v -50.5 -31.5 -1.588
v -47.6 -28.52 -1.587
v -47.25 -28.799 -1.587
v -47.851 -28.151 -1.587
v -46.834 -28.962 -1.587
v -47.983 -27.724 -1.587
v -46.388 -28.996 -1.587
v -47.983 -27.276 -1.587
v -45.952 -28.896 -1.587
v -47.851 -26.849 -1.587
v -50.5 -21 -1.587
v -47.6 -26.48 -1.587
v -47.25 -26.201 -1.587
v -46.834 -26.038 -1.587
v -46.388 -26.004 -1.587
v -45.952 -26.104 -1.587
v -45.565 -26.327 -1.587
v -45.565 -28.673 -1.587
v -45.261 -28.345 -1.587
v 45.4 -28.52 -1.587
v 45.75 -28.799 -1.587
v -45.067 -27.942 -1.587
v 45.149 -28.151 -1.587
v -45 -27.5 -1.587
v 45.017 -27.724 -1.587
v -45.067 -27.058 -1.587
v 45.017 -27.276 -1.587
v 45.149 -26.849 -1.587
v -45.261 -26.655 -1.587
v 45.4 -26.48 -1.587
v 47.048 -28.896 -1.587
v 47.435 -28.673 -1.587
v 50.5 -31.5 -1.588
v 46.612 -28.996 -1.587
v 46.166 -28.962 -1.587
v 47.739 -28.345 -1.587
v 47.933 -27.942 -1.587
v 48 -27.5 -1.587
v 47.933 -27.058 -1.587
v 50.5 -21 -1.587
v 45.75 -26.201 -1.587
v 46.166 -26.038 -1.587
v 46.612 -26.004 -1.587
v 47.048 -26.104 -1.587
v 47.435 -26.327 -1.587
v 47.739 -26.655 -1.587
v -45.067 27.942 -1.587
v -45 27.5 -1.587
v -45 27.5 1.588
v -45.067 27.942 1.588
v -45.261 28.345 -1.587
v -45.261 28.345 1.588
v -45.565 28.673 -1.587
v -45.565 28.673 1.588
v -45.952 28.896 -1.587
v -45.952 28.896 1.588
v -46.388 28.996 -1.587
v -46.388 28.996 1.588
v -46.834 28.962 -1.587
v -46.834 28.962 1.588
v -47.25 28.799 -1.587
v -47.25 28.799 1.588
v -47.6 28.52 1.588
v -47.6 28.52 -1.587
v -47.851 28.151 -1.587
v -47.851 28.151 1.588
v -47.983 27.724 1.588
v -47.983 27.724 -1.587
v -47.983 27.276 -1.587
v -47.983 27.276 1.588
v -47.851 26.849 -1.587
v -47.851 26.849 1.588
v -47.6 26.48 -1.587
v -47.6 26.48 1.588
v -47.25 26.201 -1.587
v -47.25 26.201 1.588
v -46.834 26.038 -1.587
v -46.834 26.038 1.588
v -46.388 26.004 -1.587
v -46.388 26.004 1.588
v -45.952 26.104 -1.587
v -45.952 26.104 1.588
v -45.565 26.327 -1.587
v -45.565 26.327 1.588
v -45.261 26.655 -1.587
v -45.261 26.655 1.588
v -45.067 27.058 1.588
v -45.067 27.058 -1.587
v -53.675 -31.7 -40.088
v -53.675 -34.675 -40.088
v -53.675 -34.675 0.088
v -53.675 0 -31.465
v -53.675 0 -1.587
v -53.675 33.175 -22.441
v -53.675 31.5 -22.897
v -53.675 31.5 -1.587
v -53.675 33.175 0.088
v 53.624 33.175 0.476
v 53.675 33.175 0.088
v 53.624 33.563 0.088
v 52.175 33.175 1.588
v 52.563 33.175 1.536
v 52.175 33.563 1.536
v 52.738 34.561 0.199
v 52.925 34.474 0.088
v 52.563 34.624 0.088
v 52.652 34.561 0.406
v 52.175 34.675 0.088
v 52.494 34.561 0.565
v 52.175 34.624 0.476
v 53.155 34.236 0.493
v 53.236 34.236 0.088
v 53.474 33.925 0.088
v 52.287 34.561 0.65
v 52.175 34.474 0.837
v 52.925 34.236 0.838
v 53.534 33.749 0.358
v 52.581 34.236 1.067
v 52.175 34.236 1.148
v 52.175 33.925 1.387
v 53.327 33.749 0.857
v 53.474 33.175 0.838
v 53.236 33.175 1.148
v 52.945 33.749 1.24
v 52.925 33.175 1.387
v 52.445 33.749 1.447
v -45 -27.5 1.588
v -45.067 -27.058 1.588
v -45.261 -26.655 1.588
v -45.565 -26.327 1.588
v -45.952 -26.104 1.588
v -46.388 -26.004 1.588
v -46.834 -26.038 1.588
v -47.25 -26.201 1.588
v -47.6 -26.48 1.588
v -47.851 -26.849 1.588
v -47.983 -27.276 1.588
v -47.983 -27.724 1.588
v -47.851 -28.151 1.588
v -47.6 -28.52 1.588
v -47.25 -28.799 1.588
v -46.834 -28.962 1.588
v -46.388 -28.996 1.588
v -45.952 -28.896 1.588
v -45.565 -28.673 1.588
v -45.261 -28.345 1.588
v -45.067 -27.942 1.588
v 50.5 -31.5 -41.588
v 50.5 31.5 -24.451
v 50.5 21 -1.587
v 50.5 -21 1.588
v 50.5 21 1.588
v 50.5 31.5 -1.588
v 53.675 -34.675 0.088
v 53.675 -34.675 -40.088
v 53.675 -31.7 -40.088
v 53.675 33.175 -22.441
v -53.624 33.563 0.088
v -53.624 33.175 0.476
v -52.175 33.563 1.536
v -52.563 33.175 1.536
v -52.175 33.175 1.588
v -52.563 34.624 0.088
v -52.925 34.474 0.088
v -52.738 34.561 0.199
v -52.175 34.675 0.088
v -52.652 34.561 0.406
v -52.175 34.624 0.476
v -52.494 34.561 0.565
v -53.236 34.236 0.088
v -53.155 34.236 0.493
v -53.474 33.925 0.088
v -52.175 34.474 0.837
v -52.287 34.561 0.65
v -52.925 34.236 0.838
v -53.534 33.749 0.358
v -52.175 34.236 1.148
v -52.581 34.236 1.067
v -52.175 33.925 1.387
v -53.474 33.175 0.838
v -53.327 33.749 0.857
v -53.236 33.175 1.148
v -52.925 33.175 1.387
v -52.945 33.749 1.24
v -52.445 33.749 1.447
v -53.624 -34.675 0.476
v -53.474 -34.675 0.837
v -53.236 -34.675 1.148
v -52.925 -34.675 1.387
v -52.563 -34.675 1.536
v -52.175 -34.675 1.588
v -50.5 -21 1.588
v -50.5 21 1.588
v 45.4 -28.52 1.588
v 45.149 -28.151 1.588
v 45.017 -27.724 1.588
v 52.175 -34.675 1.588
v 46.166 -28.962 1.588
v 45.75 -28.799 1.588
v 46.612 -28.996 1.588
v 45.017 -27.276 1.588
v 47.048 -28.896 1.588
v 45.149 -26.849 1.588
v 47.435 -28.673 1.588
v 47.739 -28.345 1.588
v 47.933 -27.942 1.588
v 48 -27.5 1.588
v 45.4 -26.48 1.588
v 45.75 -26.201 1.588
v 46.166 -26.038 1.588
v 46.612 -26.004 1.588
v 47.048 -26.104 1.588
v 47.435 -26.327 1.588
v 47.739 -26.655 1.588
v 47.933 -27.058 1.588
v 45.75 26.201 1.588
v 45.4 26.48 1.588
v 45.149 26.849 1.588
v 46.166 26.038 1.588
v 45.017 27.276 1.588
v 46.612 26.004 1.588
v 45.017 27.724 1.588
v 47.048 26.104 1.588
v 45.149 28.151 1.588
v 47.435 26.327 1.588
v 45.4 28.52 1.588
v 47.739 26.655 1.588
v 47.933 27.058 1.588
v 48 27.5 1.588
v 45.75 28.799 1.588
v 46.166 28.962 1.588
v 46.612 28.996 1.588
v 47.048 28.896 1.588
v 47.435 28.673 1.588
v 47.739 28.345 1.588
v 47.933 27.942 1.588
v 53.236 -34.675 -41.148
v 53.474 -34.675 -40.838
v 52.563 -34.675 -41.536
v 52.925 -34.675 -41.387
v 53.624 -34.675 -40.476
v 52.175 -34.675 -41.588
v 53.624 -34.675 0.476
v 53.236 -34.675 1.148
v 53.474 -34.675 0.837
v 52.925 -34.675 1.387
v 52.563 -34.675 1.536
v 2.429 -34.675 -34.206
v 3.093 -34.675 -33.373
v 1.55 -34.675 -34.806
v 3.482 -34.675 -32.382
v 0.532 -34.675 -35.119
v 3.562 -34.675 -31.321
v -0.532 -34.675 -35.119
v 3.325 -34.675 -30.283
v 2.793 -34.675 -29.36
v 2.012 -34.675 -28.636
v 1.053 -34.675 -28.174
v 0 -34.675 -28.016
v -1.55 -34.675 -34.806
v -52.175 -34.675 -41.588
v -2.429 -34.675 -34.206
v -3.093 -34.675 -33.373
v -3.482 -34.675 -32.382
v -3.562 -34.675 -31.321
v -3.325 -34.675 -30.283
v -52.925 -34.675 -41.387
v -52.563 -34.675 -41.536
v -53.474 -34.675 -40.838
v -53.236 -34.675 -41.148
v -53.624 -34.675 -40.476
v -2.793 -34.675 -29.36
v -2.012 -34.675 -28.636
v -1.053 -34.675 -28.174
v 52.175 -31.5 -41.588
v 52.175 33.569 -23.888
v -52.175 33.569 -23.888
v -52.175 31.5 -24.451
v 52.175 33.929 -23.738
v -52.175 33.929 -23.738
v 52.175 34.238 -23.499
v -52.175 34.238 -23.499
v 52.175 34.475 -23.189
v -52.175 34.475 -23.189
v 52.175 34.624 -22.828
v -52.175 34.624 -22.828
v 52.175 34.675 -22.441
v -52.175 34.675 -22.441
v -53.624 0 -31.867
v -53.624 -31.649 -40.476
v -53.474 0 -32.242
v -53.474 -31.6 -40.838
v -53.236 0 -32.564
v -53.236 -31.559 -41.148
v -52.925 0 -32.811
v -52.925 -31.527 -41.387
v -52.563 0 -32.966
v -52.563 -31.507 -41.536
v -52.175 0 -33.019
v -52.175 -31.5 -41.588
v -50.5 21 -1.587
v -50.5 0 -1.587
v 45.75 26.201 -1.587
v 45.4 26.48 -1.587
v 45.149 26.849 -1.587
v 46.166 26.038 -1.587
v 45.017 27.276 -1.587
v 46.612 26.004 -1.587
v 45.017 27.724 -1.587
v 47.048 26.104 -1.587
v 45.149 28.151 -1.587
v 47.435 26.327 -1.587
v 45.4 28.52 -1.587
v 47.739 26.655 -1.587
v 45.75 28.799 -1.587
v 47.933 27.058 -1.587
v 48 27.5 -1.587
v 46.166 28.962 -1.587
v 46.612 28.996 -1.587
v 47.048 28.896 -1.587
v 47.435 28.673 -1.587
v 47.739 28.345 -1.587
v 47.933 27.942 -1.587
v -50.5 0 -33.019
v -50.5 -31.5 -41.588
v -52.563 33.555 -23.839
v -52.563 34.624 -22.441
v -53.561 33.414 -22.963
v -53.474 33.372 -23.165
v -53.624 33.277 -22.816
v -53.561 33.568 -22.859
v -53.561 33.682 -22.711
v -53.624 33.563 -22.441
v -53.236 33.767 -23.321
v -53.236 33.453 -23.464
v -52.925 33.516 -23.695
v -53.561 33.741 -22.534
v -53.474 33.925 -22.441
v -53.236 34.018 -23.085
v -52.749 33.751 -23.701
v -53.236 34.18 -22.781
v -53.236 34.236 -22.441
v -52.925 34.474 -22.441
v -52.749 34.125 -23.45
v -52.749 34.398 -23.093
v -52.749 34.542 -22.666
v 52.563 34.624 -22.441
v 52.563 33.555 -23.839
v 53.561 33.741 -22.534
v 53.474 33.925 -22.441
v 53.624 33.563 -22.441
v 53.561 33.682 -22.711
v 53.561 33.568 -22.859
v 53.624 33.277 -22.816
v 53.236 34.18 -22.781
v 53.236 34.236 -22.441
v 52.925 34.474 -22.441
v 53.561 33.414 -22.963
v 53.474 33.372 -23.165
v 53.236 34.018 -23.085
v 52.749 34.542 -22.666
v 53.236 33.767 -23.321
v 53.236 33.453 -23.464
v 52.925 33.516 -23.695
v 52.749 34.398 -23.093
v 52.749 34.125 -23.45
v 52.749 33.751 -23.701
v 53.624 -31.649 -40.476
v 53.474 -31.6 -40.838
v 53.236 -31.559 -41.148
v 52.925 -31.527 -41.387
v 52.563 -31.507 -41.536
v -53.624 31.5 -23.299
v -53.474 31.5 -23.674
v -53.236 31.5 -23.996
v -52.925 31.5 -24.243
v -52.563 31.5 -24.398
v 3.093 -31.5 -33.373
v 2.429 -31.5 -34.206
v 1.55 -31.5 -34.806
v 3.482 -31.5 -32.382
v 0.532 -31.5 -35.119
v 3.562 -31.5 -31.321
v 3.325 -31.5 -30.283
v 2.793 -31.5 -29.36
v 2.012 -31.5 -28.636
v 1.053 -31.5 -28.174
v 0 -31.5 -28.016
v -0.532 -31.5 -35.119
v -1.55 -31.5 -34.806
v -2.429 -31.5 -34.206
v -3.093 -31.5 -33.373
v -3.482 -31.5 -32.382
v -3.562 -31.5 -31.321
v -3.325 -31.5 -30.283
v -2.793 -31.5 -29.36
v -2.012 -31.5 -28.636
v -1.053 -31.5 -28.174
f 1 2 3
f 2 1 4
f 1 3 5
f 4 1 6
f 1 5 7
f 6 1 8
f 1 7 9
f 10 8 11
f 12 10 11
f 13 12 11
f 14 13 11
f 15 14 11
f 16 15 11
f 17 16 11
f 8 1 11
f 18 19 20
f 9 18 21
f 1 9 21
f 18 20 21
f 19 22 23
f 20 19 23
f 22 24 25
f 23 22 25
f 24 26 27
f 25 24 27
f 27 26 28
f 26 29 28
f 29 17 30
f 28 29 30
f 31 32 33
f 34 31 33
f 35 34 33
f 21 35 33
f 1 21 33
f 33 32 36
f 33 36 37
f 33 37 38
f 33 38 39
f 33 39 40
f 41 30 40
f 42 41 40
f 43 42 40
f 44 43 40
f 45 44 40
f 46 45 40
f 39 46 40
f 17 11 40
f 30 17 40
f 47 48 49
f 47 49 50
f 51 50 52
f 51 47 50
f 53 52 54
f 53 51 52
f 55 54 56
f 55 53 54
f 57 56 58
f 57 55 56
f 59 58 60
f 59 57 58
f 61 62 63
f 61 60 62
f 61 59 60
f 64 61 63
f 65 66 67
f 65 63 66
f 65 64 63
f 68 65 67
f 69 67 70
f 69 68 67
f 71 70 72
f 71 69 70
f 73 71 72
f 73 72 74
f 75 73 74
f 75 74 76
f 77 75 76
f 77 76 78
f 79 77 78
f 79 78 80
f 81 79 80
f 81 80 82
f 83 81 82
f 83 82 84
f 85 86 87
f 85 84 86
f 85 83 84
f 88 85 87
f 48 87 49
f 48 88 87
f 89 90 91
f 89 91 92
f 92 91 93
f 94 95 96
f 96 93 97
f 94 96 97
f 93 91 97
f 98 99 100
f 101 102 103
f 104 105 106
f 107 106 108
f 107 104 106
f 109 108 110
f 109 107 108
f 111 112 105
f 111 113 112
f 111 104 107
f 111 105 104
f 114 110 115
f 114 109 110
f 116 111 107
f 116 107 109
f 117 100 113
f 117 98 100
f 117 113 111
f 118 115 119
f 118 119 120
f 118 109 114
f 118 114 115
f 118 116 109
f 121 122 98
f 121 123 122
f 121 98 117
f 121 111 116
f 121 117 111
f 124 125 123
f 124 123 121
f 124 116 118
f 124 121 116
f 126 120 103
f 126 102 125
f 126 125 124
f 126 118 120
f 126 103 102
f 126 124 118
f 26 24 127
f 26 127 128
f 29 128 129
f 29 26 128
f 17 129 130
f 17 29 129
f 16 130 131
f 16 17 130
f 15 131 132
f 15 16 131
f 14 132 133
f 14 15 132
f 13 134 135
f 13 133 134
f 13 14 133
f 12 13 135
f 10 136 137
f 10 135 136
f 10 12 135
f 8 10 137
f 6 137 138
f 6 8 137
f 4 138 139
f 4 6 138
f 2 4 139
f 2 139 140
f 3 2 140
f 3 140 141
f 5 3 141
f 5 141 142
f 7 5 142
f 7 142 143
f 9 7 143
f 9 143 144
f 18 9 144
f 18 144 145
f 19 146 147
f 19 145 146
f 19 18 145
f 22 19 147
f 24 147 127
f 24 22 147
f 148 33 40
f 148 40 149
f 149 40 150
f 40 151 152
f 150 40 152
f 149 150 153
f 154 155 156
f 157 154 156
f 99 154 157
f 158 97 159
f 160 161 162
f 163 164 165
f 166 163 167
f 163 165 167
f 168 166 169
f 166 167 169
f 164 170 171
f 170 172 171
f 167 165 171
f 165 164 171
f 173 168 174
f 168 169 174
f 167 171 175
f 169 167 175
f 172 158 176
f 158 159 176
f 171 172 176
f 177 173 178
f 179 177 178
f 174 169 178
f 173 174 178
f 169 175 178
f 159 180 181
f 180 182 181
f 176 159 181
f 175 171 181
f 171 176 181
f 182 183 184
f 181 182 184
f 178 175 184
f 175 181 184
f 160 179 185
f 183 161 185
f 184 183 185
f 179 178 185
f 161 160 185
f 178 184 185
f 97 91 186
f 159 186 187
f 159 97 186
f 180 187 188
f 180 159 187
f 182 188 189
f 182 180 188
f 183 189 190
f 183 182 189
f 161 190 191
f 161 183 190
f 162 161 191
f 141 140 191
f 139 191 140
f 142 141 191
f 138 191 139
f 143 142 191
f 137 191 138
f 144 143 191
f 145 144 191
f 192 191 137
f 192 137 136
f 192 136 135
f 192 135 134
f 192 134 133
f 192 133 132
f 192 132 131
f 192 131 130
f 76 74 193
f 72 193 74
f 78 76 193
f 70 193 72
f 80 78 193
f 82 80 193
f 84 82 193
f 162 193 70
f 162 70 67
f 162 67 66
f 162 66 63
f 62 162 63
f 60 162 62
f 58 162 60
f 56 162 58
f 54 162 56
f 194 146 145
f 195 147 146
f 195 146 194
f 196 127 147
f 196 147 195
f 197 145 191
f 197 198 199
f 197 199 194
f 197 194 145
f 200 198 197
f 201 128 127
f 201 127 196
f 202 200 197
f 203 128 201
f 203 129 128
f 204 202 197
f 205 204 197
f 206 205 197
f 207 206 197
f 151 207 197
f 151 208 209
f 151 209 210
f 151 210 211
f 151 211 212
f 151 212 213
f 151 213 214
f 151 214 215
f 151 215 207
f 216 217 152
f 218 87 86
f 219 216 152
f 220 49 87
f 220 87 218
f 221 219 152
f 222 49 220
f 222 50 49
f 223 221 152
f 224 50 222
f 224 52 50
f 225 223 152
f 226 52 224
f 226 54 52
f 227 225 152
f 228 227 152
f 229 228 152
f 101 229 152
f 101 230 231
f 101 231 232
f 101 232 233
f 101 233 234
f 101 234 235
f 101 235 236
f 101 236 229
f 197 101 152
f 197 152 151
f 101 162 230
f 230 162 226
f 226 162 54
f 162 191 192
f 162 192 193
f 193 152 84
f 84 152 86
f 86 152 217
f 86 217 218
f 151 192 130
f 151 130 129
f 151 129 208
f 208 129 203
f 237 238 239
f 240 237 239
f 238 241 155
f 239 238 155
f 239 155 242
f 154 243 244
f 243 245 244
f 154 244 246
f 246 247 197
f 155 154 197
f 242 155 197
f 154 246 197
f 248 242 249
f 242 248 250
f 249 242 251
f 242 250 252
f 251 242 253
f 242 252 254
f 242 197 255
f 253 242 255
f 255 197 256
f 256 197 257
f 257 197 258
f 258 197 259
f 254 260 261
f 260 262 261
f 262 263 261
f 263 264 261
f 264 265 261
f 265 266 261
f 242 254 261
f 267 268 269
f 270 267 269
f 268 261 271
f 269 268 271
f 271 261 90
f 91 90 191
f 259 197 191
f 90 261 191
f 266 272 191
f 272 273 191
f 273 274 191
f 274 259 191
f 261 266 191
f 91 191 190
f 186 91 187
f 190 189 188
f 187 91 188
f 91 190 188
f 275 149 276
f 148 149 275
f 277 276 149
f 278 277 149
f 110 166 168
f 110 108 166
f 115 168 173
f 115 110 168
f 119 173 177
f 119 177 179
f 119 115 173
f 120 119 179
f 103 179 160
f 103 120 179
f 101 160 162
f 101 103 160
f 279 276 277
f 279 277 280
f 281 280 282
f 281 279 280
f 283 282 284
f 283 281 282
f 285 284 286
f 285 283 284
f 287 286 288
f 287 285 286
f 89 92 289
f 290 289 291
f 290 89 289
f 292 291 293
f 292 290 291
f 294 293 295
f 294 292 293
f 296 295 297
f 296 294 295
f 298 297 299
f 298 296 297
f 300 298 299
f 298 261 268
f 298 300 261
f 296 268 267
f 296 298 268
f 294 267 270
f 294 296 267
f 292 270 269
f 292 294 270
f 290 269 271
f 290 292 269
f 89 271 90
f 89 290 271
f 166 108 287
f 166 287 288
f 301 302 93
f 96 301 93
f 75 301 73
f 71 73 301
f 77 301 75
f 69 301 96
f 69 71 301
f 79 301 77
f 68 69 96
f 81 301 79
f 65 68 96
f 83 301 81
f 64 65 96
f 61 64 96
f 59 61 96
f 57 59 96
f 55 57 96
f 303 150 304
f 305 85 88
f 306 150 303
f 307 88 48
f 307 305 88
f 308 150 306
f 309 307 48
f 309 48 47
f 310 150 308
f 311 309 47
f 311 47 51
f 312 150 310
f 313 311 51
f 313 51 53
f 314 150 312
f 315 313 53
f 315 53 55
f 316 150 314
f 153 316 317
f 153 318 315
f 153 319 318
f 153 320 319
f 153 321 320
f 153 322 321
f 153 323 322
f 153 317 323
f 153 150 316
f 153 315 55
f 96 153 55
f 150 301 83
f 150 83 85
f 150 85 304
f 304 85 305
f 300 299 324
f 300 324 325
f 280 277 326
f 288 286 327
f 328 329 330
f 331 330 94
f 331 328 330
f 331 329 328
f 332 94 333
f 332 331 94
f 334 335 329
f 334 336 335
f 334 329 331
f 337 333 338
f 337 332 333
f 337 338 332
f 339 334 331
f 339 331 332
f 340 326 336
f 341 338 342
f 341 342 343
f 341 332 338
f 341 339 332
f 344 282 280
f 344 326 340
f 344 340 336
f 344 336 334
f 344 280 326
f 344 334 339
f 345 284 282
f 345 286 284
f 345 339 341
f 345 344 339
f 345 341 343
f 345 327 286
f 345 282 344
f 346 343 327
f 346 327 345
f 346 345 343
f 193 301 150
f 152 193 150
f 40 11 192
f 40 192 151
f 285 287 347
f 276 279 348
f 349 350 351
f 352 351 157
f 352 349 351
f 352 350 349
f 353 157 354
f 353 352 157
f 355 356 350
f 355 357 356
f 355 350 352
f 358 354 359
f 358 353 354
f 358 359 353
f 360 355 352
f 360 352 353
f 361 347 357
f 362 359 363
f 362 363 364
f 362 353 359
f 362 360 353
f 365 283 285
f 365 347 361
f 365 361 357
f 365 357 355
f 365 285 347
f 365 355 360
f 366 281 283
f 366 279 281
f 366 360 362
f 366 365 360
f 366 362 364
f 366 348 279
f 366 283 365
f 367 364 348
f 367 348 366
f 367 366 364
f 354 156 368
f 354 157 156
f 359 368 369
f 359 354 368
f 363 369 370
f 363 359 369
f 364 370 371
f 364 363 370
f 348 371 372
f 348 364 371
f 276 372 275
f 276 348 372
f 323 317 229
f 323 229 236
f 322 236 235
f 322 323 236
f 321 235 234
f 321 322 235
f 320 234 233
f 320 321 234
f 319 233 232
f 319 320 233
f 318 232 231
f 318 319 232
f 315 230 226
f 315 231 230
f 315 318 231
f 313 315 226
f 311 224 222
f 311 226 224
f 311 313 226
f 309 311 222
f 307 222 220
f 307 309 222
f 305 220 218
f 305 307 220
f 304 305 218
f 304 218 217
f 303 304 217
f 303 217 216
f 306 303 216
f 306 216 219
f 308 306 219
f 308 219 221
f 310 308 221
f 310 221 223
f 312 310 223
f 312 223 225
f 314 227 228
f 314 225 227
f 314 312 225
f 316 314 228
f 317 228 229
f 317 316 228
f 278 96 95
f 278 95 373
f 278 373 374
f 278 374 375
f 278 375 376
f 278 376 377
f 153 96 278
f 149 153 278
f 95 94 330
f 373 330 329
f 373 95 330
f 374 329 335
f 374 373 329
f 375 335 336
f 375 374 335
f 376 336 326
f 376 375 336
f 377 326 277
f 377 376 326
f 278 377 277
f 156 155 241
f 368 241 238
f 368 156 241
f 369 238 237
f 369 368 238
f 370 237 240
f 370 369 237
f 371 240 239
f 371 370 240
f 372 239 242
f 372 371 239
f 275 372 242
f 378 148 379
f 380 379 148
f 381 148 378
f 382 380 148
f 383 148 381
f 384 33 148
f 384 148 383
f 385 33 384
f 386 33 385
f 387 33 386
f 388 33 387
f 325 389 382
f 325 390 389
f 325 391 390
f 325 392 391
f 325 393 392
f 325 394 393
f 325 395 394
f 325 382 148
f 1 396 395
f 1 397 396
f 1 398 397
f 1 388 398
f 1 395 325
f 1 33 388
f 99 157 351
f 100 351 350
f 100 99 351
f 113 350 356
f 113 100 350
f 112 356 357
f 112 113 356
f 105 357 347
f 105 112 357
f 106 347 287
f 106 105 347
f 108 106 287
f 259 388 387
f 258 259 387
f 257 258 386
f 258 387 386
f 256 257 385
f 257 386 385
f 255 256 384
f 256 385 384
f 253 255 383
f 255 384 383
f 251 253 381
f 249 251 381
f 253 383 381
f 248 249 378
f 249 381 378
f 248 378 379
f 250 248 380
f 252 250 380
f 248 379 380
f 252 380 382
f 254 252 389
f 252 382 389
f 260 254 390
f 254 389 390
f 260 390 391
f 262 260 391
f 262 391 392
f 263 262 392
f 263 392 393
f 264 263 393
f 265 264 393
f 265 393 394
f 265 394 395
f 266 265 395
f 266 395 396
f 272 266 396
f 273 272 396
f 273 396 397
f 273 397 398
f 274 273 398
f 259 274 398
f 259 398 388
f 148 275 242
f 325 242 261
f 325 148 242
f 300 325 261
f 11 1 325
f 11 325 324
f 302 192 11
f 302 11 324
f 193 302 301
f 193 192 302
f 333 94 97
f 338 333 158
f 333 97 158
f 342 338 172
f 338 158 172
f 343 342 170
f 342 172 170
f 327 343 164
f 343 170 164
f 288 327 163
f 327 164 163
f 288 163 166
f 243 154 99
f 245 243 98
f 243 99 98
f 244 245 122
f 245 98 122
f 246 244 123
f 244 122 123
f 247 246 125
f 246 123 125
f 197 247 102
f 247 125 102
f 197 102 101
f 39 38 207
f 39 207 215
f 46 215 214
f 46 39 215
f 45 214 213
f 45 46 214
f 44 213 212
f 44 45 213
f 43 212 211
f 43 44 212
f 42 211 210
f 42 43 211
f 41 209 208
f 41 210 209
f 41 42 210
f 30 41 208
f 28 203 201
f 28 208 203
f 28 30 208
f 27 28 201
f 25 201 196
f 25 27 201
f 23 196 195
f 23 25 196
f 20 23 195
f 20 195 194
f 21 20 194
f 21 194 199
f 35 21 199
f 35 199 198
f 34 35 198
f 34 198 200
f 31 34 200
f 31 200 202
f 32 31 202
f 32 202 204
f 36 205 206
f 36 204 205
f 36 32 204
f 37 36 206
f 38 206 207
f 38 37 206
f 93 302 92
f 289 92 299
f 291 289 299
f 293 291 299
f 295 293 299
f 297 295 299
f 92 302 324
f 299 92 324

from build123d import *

# Parameters (mm, degrees)
SKETCH1_W               = 107.35
SKETCH1_H               = 69.35
BOSS_EXTRUDE1_DEPTH     = 1.5875
CUT_EXTRUDE2_DEPTH      = 64.920899605
CUT_EXTRUDE2_DEPTH_BACK = 64.920899605
SKETCH2_R               = 1.5
SKETCH2_W               = 101
SKETCH2_H               = 42
SKETCH3_W               = 107.35
SKETCH3_H               = 69.35
SKETCH3_W_2             = 101
SKETCH3_H_2             = 63
BOSS_EXTRUDE2_DEPTH     = 40
SKETCH5_R               = 3.571875
CUT_EXTRUDE3_DEPTH      = 25.4
CUT_EXTRUDE4_DEPTH      = 121.232683914
SKETCH10_W              = 47.370876146
SKETCH10_H              = 31.5
CUT_EXTRUDE5_DEPTH      = 25.4
FILLET1_R               = 1.5


with BuildPart() as part:
    # Sketch1 → Boss-Extrude1 (new, symmetric)
    with BuildSketch(Plane.XY):
        Rectangle(SKETCH1_W, SKETCH1_H)
    extrude(amount=BOSS_EXTRUDE1_DEPTH, both=True)

    # Sketch2 → Cut-Extrude2 (cut, two sides: drawn at the far end of the back side and taken through both)
    with BuildSketch(Plane.XY.offset(-CUT_EXTRUDE2_DEPTH_BACK)):
        with Locations((-46.5, 27.5)):
            Circle(SKETCH2_R)
        with Locations((46.5, 27.5)):
            Circle(SKETCH2_R)
        with Locations((46.5, -27.5)):
            Circle(SKETCH2_R)
        with Locations((-46.5, -27.5)):
            Circle(SKETCH2_R)
        Rectangle(SKETCH2_W, SKETCH2_H)
    extrude(amount=CUT_EXTRUDE2_DEPTH + CUT_EXTRUDE2_DEPTH_BACK, mode=Mode.SUBTRACT)

    # Sketch3 → Boss-Extrude2 (add)
    with BuildSketch(Plane(origin=(0, 0, -1.5875), x_dir=(-1, 0, 0), z_dir=(0, 0, -1))):
        Rectangle(SKETCH3_W, SKETCH3_H)
        Rectangle(SKETCH3_W_2, SKETCH3_H_2, mode=Mode.SUBTRACT)
    extrude(amount=BOSS_EXTRUDE2_DEPTH)

    # Sketch5 → Cut-Extrude3 (cut)
    with BuildSketch(Plane(origin=(0, -31.5, 0), x_dir=(1, 0, 0), z_dir=(0, 1, 0))):
        with Locations(Location((0, 31.5875, 0), (0, 0, 270))):
            Circle(SKETCH5_R)
    extrude(amount=-CUT_EXTRUDE3_DEPTH, mode=Mode.SUBTRACT)

    # Sketch8 → Cut-Extrude4 (cut, through all)
    with BuildSketch(Plane.ZY.offset(53.675)):
        Polygon((-23.5875, 34.675), (-41.5875, -31.5), (-41.5875, 34.675), align=None)
    extrude(amount=-CUT_EXTRUDE4_DEPTH, mode=Mode.SUBTRACT)

    # Sketch10 → Cut-Extrude5 (cut)
    with BuildSketch(Plane(origin=(-50.5, 0, 0), x_dir=(0, 0, -1), z_dir=(1, 0, 0))):
        with Locations((25.272938073, 15.75)):
            Rectangle(SKETCH10_W, SKETCH10_H)
    extrude(amount=-CUT_EXTRUDE5_DEPTH, mode=Mode.SUBTRACT)

    # Fillet1
    fillet1_edges = [part.edges().sort_by_distance(p)[0] for p in [
        (-53.675, 0, 1.5875),
        (-53.675, -33.0875, -41.5875),
        (53.675, 0, 1.5875),
        (53.675, -33.0875, -41.5875),
        (-53.675, 34.675, -11),
        (53.675, 34.675, -11),
        (53.675, 1.5875, -32.5875),
        (0, 34.675, -23.5875),
        (-53.675, -15.75, -37.303404798),
        (0, 34.675, 1.5875),
        (-53.675, 33.0875, -24.019309596),
    ]]
    fillet(fillet1_edges, radius=FILLET1_R)


solid = part.part
